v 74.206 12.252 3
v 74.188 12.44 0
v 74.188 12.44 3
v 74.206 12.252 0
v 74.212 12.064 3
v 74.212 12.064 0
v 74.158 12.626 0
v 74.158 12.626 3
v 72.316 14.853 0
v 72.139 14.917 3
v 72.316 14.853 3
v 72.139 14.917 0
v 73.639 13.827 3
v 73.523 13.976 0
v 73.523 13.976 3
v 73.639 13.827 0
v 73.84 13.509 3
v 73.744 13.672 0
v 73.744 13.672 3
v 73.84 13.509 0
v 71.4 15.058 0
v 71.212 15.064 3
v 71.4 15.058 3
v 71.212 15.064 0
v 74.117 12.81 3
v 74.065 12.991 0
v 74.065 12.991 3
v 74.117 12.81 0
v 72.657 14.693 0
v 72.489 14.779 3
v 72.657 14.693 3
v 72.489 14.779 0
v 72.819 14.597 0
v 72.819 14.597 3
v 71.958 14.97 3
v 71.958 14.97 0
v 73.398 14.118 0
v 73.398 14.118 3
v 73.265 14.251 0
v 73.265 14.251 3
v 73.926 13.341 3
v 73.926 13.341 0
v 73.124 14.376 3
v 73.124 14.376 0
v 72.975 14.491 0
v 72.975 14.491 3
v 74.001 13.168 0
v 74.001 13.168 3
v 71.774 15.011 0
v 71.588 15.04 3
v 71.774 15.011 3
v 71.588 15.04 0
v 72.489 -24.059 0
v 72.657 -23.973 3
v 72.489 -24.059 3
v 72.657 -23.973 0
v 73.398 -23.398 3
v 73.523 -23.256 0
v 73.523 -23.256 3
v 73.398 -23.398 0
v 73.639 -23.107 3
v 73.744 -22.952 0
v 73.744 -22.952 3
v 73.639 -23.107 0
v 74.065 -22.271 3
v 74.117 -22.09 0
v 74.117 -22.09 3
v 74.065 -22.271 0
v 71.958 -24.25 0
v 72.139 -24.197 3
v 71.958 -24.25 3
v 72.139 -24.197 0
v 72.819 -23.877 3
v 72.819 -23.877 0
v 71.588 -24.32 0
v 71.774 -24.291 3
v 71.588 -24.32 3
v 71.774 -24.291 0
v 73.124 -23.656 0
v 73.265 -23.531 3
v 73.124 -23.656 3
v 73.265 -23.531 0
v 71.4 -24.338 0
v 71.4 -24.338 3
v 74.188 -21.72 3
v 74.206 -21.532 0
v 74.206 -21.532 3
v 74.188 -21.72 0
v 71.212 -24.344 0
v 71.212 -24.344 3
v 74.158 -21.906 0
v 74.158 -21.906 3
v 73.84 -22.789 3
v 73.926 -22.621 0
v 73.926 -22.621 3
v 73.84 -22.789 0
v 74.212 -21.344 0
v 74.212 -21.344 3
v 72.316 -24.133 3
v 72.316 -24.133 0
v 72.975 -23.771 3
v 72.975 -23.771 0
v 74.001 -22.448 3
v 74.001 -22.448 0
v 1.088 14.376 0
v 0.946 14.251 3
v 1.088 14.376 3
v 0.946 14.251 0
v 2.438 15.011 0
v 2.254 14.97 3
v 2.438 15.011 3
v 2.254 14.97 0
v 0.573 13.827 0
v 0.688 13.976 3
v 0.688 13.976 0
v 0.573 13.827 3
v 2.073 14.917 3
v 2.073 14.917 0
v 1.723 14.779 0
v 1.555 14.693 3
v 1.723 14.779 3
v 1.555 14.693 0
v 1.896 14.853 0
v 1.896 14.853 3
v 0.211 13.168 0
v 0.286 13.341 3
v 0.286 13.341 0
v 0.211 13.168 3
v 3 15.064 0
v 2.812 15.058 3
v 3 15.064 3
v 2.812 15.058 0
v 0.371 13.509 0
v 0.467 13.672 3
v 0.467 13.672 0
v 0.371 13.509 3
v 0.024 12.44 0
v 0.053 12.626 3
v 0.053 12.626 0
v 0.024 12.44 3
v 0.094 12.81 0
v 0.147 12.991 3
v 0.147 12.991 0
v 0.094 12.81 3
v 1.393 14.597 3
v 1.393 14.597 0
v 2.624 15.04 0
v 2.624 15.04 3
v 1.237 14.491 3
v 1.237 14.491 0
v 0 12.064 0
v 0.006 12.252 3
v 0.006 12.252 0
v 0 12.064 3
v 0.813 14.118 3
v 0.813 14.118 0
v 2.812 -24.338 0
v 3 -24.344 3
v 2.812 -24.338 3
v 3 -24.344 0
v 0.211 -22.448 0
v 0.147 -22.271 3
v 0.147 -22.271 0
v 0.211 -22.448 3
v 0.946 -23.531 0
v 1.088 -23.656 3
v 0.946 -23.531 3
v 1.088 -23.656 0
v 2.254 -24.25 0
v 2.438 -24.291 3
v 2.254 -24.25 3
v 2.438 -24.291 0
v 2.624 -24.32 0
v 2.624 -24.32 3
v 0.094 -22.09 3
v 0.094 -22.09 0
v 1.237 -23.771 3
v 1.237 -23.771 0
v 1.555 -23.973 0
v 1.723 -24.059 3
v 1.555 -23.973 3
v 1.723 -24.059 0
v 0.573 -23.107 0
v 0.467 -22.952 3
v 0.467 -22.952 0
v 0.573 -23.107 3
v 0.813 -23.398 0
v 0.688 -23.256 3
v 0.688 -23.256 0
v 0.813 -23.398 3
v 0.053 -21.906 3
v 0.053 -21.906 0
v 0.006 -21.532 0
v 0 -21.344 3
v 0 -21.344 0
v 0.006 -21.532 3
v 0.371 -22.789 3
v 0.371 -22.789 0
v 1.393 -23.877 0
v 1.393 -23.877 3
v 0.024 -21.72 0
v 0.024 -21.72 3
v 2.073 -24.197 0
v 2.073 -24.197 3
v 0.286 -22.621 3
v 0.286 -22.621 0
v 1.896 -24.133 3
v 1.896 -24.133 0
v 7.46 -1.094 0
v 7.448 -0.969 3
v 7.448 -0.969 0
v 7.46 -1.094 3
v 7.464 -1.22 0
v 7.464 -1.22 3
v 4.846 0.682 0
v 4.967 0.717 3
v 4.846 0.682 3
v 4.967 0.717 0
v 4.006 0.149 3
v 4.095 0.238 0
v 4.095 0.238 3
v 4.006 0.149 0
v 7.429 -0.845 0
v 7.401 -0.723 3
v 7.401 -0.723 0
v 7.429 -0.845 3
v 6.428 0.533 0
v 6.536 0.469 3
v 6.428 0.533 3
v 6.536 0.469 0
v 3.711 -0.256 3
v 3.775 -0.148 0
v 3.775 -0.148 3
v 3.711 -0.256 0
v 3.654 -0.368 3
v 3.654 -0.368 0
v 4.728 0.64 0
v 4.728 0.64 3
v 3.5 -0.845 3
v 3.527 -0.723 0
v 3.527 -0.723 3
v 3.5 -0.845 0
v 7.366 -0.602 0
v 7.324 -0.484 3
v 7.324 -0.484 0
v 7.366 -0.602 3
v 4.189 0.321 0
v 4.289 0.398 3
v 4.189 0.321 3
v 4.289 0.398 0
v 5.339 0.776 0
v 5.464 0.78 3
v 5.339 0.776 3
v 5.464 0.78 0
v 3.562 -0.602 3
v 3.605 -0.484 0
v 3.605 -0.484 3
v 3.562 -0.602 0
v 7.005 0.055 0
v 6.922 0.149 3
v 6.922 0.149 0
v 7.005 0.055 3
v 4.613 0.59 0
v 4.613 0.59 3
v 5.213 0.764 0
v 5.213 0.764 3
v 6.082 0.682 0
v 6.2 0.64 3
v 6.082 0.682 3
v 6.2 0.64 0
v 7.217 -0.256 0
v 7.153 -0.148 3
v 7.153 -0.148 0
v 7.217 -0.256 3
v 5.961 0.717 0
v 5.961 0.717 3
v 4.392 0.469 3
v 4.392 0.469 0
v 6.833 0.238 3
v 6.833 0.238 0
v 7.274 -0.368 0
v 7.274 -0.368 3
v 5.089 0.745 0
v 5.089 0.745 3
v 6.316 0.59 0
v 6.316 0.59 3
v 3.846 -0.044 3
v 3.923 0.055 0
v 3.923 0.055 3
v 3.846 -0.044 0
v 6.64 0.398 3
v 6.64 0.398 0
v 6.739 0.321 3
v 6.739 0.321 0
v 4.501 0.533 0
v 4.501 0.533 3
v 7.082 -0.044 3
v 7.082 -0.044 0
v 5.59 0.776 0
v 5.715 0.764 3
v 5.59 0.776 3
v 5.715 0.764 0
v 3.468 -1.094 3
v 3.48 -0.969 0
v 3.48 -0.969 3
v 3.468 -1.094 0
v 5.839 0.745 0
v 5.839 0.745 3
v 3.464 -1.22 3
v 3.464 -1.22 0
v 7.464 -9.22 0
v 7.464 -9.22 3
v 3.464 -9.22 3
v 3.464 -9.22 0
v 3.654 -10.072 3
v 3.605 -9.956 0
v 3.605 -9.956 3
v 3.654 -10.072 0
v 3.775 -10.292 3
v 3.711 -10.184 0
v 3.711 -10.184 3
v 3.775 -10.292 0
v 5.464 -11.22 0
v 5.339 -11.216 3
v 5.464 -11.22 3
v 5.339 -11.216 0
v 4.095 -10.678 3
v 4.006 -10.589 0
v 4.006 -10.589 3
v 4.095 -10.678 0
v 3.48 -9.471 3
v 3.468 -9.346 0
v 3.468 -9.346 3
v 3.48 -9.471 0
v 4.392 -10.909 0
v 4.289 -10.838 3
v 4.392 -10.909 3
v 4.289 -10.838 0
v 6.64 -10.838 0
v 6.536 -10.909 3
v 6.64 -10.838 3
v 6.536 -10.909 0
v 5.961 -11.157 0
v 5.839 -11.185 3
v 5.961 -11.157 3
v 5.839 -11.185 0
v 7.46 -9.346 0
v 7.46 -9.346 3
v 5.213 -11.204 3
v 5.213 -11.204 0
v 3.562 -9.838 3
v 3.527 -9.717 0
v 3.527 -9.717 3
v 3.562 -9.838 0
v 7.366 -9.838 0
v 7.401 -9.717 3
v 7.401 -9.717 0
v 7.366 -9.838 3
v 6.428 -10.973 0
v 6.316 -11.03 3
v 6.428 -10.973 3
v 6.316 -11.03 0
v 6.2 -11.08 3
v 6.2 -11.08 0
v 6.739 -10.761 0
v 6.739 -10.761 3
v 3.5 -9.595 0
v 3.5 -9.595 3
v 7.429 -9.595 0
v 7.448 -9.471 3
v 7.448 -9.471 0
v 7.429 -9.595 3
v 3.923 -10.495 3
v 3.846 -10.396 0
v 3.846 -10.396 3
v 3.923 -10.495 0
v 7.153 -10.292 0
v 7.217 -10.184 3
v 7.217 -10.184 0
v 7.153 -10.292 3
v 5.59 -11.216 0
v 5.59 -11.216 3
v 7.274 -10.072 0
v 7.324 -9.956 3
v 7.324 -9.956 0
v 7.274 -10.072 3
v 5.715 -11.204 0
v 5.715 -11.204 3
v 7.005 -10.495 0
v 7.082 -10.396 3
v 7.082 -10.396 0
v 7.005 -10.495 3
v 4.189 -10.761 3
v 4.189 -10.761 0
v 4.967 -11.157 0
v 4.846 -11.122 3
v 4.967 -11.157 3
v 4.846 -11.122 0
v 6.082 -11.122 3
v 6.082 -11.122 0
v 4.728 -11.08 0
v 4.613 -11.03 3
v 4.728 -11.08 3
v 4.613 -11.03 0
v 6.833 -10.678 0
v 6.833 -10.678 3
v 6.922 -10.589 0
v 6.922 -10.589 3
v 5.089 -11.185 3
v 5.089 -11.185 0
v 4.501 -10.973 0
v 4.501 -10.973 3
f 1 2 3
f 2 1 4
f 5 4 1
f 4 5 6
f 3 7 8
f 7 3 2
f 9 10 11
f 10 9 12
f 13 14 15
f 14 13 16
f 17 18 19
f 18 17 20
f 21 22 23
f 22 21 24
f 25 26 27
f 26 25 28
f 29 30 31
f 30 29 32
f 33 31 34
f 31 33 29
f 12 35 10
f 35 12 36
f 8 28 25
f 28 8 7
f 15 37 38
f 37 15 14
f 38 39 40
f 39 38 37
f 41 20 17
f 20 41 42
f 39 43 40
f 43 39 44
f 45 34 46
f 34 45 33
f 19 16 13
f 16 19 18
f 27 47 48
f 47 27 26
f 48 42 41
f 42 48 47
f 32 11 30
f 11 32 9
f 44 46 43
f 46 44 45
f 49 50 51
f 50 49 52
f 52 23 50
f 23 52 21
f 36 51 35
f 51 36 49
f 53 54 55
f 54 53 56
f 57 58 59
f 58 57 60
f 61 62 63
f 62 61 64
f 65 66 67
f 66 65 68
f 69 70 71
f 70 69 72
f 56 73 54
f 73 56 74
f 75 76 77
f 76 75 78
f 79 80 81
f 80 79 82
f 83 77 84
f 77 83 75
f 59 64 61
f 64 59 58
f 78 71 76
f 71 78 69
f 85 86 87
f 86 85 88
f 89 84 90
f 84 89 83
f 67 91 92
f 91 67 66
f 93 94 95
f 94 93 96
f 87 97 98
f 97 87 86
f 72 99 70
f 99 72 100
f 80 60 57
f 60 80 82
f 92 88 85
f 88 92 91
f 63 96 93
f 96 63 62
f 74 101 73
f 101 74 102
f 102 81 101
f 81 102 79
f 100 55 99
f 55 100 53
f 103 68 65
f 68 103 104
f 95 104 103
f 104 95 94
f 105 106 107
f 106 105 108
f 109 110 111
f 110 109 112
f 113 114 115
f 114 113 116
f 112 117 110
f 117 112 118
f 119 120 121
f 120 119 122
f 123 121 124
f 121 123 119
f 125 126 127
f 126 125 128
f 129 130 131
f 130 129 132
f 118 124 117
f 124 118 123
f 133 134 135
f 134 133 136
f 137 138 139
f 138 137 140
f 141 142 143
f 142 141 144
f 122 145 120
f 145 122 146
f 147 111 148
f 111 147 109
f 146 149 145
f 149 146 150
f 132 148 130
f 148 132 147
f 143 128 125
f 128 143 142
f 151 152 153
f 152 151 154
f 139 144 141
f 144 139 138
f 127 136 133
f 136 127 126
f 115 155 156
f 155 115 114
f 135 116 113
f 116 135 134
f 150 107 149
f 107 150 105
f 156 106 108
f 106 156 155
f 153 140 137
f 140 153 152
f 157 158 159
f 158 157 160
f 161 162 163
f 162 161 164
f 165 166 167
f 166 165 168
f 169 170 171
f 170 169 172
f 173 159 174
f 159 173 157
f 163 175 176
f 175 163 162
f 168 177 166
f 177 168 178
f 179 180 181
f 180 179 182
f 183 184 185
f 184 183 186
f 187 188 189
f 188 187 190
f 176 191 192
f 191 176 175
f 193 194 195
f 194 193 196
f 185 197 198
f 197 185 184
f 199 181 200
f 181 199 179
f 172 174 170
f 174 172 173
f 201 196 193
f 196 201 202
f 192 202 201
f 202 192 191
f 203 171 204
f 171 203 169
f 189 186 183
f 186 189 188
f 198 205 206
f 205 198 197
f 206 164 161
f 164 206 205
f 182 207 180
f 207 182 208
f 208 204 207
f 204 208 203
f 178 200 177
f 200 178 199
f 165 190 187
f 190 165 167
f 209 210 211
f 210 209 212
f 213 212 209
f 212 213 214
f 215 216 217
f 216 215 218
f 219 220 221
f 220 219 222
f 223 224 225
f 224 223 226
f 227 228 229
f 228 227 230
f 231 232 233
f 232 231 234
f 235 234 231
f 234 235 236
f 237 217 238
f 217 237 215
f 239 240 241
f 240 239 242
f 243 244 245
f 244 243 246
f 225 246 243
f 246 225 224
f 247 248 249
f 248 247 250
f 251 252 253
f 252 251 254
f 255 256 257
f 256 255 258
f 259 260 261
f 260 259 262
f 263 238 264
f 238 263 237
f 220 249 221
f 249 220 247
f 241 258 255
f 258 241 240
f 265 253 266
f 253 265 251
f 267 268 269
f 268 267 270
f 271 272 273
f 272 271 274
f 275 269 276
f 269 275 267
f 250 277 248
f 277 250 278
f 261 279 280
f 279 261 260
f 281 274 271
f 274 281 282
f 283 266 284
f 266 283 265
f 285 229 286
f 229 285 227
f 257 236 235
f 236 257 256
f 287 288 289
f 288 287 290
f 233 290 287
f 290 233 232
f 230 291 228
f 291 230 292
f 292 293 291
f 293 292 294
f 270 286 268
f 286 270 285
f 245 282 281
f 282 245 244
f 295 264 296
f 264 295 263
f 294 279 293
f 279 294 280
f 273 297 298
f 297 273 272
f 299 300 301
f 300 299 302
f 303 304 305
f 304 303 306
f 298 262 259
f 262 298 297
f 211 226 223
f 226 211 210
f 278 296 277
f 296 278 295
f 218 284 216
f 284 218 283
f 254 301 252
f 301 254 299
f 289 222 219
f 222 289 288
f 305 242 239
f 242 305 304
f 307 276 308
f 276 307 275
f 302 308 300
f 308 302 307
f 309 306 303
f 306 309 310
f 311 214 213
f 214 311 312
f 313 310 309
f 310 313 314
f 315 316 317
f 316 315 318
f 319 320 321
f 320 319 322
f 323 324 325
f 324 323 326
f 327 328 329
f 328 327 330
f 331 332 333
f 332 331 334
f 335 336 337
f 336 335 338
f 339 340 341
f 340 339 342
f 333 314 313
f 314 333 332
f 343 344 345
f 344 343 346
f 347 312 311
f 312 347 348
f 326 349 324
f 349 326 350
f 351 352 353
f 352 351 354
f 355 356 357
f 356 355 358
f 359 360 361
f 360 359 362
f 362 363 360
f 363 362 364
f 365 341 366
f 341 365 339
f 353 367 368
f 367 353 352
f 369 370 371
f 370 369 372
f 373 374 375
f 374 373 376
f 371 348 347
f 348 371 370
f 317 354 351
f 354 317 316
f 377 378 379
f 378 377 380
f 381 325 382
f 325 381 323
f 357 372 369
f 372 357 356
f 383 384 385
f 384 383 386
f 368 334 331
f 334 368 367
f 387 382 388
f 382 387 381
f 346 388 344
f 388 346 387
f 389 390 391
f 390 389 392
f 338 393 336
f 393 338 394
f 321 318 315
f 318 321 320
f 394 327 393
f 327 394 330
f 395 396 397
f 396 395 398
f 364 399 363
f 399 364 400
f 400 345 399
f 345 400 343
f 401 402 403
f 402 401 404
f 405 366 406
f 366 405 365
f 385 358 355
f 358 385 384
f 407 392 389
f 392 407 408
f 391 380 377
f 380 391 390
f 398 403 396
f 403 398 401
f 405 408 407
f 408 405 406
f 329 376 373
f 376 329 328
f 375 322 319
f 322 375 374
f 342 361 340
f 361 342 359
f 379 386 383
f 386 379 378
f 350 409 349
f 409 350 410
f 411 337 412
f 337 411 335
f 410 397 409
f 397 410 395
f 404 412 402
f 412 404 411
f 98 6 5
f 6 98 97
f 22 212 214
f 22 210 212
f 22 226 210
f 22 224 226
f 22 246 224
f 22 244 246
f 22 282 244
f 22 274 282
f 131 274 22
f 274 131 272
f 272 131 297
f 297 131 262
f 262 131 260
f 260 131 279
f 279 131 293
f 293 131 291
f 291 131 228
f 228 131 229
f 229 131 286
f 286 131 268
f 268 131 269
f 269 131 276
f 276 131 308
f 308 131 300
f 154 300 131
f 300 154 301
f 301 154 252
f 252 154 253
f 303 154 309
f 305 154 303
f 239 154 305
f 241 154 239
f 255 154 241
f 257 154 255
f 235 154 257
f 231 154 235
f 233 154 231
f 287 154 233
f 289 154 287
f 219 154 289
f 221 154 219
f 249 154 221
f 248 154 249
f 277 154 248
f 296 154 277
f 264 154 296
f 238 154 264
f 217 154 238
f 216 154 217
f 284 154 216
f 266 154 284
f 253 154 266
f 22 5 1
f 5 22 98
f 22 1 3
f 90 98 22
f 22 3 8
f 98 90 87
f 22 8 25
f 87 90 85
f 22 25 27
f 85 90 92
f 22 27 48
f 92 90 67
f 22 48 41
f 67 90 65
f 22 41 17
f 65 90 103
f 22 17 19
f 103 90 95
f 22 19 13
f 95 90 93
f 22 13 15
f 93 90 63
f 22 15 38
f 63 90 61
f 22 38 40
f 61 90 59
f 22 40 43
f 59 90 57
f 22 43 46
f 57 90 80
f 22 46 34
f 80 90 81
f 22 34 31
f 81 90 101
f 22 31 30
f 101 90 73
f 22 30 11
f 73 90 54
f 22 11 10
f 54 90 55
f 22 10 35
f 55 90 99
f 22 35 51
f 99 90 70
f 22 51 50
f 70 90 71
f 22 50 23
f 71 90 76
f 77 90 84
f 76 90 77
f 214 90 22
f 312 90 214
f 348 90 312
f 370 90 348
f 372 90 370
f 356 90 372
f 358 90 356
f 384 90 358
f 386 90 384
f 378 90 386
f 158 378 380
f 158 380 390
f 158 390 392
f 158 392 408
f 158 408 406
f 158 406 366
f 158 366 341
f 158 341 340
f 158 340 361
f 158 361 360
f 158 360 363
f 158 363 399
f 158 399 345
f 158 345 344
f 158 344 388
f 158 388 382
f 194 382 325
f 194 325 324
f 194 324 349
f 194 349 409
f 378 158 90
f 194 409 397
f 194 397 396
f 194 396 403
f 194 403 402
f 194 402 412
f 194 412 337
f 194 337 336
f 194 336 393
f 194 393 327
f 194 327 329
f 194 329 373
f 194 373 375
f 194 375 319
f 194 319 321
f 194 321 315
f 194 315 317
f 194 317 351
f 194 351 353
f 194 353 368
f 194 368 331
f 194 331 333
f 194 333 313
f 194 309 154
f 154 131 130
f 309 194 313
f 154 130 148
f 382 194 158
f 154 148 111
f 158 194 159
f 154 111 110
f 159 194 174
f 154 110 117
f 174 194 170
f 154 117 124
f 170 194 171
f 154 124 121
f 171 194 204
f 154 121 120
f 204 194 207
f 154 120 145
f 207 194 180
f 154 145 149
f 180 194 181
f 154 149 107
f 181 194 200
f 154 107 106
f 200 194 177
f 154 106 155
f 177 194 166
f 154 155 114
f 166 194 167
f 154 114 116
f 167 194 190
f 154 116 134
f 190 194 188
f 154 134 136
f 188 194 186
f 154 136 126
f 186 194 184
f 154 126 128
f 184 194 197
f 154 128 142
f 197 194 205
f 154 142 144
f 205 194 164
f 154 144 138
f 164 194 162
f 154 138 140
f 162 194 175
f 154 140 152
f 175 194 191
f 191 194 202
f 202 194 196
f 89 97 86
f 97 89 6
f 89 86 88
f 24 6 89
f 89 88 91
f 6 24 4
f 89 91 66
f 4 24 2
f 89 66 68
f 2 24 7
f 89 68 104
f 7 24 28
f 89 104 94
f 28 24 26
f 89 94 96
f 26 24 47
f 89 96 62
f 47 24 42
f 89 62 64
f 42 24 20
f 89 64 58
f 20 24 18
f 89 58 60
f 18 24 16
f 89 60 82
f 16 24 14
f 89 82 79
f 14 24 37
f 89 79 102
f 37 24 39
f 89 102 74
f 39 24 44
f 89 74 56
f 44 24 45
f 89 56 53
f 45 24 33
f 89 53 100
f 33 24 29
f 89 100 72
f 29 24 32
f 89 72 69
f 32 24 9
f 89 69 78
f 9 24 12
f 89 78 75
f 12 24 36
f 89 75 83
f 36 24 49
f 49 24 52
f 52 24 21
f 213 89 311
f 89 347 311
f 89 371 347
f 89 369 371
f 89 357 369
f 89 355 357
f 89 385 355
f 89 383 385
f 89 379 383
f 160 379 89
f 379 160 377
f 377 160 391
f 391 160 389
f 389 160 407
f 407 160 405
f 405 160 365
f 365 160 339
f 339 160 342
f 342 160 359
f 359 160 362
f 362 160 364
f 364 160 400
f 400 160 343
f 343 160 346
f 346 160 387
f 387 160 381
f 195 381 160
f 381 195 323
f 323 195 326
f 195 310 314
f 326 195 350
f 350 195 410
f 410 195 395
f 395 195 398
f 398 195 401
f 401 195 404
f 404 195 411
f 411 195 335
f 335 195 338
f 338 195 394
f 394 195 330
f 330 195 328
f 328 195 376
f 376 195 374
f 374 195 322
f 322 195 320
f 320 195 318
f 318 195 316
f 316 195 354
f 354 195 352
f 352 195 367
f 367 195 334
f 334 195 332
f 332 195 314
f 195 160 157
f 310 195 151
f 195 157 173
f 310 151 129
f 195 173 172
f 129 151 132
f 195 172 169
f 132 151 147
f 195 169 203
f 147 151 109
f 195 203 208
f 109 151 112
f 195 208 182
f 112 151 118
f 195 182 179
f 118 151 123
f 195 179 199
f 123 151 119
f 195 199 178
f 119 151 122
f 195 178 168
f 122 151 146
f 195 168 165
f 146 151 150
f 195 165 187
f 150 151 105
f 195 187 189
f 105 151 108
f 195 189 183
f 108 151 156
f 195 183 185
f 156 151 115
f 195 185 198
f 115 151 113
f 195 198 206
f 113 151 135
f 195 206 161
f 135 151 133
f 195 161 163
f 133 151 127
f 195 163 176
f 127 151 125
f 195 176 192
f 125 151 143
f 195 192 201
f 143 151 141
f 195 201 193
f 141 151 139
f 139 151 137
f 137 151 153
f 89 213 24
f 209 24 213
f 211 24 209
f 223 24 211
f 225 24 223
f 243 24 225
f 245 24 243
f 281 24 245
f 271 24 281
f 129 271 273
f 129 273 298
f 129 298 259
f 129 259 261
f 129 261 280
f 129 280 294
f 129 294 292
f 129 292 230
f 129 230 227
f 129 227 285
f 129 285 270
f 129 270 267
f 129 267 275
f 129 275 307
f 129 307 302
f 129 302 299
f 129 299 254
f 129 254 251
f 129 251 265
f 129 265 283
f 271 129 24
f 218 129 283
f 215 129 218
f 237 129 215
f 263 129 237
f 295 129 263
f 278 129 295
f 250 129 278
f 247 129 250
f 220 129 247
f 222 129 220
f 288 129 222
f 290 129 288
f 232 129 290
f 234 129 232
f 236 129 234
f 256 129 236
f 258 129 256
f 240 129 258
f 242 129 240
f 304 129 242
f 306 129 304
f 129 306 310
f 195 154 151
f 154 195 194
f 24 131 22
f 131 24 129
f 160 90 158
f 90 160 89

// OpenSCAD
use <write/Write.scad>  //Change to directory where write.scad resides;
// Enter Text here
// Use up to 10 lines as needed; for alignment to center or right, use spaces

/* [Text] */
// You can use (up to) 10 lines for text

line_1="Just enter";
line_2="name and";
line_3="address";
line_4="";
line_5="";
line_6="";
line_7="";
line_8="";
line_9="";
line_10="";

/* [Text options] */

//Choose text engraving, embossing oder hiding inside
text_style=-80; // [-80:Deep engraving (80 %),-50:Half way through engraving (50 %),-10:Shallow engraving (10 %),0: Hide text inside (takes 66 %),10:Little embossing (10 %),25:Heavy embossing (25 %) ] 

font="orbitron.dxf"; //[write/orbitron.dxf:Futuristic,write/Letters.dxf:Basic,write/knewave.dxf:Round,write/BlackRose.dxf:Classic,write/braille.dxf:Braille]

//Height of characters [mm]
fontsize=8;  //[5:20]						  

letter_spacing=1; //[-2:5]
letterspacing=1.0+letter_spacing/10;		 

line_spacing=2; //[0:5]
linespacing=0.7+line_spacing/10; 	

/* [Plate options] */

// [mm]
plate_thickness=3; //[1:5]

//Radius of plate corners [mm]
corner_radius=3; //[1:10]
 
// [mm]
slitlength=12; //[2:30]		 

// [mm]
slitwidth=4; //[2:10]	


{}
/* [Hidden] */

//Copy single text variables into array
text=[
line_1,
line_2,
line_3,
line_4,
line_5,
line_6,
line_7,
line_8,
line_9,
line_10
];

//Define additional parameters
charlength=0.686;
charheight=1.45;
descenderfactor=0.25;

//Calculate margins
margin=2*sqrt(corner_radius);

//Calculate space for slit
insertlength=slitwidth+margin;

//Thickness of text when hidden
hiddenheight=66;

//Find out maximum characters for first 10 lines for centering
maxtextchars = max(len(text[0]),len(text[1]),len(text[2]),len(text[3]),len(text[4]),len(text[5]),len(text[6]),len(text[7]),len(text[8]),len(text[9]));

//Find out how many lines do contain text
tl=[
len(text[9])>0 ? 10 : 0,
len(text[8])>0 ? 9 : 0,
len(text[7])>0 ? 8 : 0,
len(text[6])>0 ? 7 : 0,
len(text[5])>0 ? 6 : 0,
len(text[4])>0 ? 5 : 0,
len(text[3])>0 ? 4 : 0,
len(text[2])>0 ? 3 : 0,
len(text[1])>0 ? 2 : 0,
len(text[0])>0 ? 1 : 0,
];

textlines=max(tl[0],tl[1],tl[2],tl[3],tl[4],tl[5],tl[6],tl[7],tl[8],tl[9]);

//Calculate plate size based on Text
linelength=maxtextchars*charlength*fontsize+(letterspacing-1)*(maxtextchars-1)*charlength*fontsize;
lineheight=charheight*fontsize;


//Part of plate with text
difference () {
	//Plate
	translate ([0,-lineheight*(textlines-1)-(linespacing-1)*lineheight*(textlines-1)-margin,0])
	cube ([linelength+margin*2+insertlength,+lineheight*(textlines-1)+(linespacing-1)*lineheight*(textlines-1)+margin+lineheight+margin,plate_thickness]);

	//"Add" Text if engraved
	if (text_style<0) {
	translate ([margin+insertlength,0,0])
		union () {
			for (i=[0:textlines-1]) {
			translate ([0,-lineheight*i+descenderfactor*lineheight-(linespacing-1)*lineheight*i,plate_thickness+plate_thickness*text_style/100-0.05])
			write(text[i],t=abs(text_style)*plate_thickness/100+0.1,h=fontsize,font=font,space=letterspacing);
			}
		}
	}

	if (text_style==0) {
	translate ([margin+insertlength,0,0])
		union () {
			for (i=[0:textlines-1]) {
			translate ([0,-lineheight*i+descenderfactor*lineheight-(linespacing-1)*lineheight*i,plate_thickness+plate_thickness*text_style/100-0.05-(plate_thickness+(plate_thickness*hiddenheight/100))/2])
			write(text[i],t=hiddenheight*plate_thickness/100+0.1,h=fontsize,font=font,space=letterspacing);
			}
		}
	}


	//Cut rounded corners
	//Top Right
	translate ([margin+insertlength,0,0])
	translate ([linelength+margin-corner_radius,lineheight+margin-corner_radius,-0.05])
	difference () {
		cube ([corner_radius*2,corner_radius*2,plate_thickness+0.1]);
		translate ([0,0,-0.1])
		cylinder (r=corner_radius,h=plate_thickness+0.2,$fn=100);
	}

	//Bottom Right
	translate ([margin+insertlength,0,0])
	translate ([linelength+margin-corner_radius,-lineheight*(textlines-1)-(linespacing-1)*lineheight*(textlines-1)-margin+corner_radius,-0.05])
	difference () {
		translate ([0,-corner_radius*2,0])
		cube ([corner_radius*2,corner_radius*2,plate_thickness+0.1]);
		translate ([0,0,-0.1])
		cylinder (r=corner_radius,h=plate_thickness+0.2,$fn=100);
	}

	//Top Left
	translate ([0,0,0])
	translate ([corner_radius,lineheight+margin-corner_radius,-0.05])
	difference () {
		translate ([-corner_radius*2,0,0])
		cube ([corner_radius*2,corner_radius*2,plate_thickness+0.1]);
		translate ([0,0,-0.1])
		cylinder (r=corner_radius,h=plate_thickness+0.2,$fn=100);
	}

	//Bottom Left
	translate ([0,0,0])
	translate ([corner_radius,-lineheight*(textlines-1)-(linespacing-1)*lineheight*(textlines-1)-margin+corner_radius,-0.05])
	difference () {
		translate ([-corner_radius*2,-corner_radius*2,0])
		cube ([corner_radius*2,corner_radius*2,plate_thickness+0.1]);
		translate ([0,0,-0.1])
		cylinder (r=corner_radius,h=plate_thickness+0.2,$fn=100);
	}

	//Cut out hole
	translate ([margin,-lineheight*(textlines/2-1)-(linespacing-1)*lineheight*(textlines/2-1)-slitlength/2+slitwidth/2,-0.05])
	union () {
		translate ([slitwidth/2,slitlength-slitwidth,0])
		cylinder (r=slitwidth/2,h=plate_thickness+0.1,$fn=100);
		cube ([slitwidth,slitlength-slitwidth,plate_thickness+0.1]);		
		translate ([slitwidth/2,0,0])
		cylinder (r=slitwidth/2,h=plate_thickness+0.1,$fn=100);
	}
}  //End difference

//Add text if embossed
if (text_style>0) {
	translate ([margin+insertlength,0,0])
		color ("YellowGreen")
		union () {
			for (i=[0:textlines-1]) {
			translate ([0,-lineheight*i+descenderfactor*lineheight-(linespacing-1)*lineheight*i,plate_thickness])
			write(text[i],t=abs(text_style)*plate_thickness/100+0.1,h=fontsize,font=font,space=letterspacing);
			}
}
}
